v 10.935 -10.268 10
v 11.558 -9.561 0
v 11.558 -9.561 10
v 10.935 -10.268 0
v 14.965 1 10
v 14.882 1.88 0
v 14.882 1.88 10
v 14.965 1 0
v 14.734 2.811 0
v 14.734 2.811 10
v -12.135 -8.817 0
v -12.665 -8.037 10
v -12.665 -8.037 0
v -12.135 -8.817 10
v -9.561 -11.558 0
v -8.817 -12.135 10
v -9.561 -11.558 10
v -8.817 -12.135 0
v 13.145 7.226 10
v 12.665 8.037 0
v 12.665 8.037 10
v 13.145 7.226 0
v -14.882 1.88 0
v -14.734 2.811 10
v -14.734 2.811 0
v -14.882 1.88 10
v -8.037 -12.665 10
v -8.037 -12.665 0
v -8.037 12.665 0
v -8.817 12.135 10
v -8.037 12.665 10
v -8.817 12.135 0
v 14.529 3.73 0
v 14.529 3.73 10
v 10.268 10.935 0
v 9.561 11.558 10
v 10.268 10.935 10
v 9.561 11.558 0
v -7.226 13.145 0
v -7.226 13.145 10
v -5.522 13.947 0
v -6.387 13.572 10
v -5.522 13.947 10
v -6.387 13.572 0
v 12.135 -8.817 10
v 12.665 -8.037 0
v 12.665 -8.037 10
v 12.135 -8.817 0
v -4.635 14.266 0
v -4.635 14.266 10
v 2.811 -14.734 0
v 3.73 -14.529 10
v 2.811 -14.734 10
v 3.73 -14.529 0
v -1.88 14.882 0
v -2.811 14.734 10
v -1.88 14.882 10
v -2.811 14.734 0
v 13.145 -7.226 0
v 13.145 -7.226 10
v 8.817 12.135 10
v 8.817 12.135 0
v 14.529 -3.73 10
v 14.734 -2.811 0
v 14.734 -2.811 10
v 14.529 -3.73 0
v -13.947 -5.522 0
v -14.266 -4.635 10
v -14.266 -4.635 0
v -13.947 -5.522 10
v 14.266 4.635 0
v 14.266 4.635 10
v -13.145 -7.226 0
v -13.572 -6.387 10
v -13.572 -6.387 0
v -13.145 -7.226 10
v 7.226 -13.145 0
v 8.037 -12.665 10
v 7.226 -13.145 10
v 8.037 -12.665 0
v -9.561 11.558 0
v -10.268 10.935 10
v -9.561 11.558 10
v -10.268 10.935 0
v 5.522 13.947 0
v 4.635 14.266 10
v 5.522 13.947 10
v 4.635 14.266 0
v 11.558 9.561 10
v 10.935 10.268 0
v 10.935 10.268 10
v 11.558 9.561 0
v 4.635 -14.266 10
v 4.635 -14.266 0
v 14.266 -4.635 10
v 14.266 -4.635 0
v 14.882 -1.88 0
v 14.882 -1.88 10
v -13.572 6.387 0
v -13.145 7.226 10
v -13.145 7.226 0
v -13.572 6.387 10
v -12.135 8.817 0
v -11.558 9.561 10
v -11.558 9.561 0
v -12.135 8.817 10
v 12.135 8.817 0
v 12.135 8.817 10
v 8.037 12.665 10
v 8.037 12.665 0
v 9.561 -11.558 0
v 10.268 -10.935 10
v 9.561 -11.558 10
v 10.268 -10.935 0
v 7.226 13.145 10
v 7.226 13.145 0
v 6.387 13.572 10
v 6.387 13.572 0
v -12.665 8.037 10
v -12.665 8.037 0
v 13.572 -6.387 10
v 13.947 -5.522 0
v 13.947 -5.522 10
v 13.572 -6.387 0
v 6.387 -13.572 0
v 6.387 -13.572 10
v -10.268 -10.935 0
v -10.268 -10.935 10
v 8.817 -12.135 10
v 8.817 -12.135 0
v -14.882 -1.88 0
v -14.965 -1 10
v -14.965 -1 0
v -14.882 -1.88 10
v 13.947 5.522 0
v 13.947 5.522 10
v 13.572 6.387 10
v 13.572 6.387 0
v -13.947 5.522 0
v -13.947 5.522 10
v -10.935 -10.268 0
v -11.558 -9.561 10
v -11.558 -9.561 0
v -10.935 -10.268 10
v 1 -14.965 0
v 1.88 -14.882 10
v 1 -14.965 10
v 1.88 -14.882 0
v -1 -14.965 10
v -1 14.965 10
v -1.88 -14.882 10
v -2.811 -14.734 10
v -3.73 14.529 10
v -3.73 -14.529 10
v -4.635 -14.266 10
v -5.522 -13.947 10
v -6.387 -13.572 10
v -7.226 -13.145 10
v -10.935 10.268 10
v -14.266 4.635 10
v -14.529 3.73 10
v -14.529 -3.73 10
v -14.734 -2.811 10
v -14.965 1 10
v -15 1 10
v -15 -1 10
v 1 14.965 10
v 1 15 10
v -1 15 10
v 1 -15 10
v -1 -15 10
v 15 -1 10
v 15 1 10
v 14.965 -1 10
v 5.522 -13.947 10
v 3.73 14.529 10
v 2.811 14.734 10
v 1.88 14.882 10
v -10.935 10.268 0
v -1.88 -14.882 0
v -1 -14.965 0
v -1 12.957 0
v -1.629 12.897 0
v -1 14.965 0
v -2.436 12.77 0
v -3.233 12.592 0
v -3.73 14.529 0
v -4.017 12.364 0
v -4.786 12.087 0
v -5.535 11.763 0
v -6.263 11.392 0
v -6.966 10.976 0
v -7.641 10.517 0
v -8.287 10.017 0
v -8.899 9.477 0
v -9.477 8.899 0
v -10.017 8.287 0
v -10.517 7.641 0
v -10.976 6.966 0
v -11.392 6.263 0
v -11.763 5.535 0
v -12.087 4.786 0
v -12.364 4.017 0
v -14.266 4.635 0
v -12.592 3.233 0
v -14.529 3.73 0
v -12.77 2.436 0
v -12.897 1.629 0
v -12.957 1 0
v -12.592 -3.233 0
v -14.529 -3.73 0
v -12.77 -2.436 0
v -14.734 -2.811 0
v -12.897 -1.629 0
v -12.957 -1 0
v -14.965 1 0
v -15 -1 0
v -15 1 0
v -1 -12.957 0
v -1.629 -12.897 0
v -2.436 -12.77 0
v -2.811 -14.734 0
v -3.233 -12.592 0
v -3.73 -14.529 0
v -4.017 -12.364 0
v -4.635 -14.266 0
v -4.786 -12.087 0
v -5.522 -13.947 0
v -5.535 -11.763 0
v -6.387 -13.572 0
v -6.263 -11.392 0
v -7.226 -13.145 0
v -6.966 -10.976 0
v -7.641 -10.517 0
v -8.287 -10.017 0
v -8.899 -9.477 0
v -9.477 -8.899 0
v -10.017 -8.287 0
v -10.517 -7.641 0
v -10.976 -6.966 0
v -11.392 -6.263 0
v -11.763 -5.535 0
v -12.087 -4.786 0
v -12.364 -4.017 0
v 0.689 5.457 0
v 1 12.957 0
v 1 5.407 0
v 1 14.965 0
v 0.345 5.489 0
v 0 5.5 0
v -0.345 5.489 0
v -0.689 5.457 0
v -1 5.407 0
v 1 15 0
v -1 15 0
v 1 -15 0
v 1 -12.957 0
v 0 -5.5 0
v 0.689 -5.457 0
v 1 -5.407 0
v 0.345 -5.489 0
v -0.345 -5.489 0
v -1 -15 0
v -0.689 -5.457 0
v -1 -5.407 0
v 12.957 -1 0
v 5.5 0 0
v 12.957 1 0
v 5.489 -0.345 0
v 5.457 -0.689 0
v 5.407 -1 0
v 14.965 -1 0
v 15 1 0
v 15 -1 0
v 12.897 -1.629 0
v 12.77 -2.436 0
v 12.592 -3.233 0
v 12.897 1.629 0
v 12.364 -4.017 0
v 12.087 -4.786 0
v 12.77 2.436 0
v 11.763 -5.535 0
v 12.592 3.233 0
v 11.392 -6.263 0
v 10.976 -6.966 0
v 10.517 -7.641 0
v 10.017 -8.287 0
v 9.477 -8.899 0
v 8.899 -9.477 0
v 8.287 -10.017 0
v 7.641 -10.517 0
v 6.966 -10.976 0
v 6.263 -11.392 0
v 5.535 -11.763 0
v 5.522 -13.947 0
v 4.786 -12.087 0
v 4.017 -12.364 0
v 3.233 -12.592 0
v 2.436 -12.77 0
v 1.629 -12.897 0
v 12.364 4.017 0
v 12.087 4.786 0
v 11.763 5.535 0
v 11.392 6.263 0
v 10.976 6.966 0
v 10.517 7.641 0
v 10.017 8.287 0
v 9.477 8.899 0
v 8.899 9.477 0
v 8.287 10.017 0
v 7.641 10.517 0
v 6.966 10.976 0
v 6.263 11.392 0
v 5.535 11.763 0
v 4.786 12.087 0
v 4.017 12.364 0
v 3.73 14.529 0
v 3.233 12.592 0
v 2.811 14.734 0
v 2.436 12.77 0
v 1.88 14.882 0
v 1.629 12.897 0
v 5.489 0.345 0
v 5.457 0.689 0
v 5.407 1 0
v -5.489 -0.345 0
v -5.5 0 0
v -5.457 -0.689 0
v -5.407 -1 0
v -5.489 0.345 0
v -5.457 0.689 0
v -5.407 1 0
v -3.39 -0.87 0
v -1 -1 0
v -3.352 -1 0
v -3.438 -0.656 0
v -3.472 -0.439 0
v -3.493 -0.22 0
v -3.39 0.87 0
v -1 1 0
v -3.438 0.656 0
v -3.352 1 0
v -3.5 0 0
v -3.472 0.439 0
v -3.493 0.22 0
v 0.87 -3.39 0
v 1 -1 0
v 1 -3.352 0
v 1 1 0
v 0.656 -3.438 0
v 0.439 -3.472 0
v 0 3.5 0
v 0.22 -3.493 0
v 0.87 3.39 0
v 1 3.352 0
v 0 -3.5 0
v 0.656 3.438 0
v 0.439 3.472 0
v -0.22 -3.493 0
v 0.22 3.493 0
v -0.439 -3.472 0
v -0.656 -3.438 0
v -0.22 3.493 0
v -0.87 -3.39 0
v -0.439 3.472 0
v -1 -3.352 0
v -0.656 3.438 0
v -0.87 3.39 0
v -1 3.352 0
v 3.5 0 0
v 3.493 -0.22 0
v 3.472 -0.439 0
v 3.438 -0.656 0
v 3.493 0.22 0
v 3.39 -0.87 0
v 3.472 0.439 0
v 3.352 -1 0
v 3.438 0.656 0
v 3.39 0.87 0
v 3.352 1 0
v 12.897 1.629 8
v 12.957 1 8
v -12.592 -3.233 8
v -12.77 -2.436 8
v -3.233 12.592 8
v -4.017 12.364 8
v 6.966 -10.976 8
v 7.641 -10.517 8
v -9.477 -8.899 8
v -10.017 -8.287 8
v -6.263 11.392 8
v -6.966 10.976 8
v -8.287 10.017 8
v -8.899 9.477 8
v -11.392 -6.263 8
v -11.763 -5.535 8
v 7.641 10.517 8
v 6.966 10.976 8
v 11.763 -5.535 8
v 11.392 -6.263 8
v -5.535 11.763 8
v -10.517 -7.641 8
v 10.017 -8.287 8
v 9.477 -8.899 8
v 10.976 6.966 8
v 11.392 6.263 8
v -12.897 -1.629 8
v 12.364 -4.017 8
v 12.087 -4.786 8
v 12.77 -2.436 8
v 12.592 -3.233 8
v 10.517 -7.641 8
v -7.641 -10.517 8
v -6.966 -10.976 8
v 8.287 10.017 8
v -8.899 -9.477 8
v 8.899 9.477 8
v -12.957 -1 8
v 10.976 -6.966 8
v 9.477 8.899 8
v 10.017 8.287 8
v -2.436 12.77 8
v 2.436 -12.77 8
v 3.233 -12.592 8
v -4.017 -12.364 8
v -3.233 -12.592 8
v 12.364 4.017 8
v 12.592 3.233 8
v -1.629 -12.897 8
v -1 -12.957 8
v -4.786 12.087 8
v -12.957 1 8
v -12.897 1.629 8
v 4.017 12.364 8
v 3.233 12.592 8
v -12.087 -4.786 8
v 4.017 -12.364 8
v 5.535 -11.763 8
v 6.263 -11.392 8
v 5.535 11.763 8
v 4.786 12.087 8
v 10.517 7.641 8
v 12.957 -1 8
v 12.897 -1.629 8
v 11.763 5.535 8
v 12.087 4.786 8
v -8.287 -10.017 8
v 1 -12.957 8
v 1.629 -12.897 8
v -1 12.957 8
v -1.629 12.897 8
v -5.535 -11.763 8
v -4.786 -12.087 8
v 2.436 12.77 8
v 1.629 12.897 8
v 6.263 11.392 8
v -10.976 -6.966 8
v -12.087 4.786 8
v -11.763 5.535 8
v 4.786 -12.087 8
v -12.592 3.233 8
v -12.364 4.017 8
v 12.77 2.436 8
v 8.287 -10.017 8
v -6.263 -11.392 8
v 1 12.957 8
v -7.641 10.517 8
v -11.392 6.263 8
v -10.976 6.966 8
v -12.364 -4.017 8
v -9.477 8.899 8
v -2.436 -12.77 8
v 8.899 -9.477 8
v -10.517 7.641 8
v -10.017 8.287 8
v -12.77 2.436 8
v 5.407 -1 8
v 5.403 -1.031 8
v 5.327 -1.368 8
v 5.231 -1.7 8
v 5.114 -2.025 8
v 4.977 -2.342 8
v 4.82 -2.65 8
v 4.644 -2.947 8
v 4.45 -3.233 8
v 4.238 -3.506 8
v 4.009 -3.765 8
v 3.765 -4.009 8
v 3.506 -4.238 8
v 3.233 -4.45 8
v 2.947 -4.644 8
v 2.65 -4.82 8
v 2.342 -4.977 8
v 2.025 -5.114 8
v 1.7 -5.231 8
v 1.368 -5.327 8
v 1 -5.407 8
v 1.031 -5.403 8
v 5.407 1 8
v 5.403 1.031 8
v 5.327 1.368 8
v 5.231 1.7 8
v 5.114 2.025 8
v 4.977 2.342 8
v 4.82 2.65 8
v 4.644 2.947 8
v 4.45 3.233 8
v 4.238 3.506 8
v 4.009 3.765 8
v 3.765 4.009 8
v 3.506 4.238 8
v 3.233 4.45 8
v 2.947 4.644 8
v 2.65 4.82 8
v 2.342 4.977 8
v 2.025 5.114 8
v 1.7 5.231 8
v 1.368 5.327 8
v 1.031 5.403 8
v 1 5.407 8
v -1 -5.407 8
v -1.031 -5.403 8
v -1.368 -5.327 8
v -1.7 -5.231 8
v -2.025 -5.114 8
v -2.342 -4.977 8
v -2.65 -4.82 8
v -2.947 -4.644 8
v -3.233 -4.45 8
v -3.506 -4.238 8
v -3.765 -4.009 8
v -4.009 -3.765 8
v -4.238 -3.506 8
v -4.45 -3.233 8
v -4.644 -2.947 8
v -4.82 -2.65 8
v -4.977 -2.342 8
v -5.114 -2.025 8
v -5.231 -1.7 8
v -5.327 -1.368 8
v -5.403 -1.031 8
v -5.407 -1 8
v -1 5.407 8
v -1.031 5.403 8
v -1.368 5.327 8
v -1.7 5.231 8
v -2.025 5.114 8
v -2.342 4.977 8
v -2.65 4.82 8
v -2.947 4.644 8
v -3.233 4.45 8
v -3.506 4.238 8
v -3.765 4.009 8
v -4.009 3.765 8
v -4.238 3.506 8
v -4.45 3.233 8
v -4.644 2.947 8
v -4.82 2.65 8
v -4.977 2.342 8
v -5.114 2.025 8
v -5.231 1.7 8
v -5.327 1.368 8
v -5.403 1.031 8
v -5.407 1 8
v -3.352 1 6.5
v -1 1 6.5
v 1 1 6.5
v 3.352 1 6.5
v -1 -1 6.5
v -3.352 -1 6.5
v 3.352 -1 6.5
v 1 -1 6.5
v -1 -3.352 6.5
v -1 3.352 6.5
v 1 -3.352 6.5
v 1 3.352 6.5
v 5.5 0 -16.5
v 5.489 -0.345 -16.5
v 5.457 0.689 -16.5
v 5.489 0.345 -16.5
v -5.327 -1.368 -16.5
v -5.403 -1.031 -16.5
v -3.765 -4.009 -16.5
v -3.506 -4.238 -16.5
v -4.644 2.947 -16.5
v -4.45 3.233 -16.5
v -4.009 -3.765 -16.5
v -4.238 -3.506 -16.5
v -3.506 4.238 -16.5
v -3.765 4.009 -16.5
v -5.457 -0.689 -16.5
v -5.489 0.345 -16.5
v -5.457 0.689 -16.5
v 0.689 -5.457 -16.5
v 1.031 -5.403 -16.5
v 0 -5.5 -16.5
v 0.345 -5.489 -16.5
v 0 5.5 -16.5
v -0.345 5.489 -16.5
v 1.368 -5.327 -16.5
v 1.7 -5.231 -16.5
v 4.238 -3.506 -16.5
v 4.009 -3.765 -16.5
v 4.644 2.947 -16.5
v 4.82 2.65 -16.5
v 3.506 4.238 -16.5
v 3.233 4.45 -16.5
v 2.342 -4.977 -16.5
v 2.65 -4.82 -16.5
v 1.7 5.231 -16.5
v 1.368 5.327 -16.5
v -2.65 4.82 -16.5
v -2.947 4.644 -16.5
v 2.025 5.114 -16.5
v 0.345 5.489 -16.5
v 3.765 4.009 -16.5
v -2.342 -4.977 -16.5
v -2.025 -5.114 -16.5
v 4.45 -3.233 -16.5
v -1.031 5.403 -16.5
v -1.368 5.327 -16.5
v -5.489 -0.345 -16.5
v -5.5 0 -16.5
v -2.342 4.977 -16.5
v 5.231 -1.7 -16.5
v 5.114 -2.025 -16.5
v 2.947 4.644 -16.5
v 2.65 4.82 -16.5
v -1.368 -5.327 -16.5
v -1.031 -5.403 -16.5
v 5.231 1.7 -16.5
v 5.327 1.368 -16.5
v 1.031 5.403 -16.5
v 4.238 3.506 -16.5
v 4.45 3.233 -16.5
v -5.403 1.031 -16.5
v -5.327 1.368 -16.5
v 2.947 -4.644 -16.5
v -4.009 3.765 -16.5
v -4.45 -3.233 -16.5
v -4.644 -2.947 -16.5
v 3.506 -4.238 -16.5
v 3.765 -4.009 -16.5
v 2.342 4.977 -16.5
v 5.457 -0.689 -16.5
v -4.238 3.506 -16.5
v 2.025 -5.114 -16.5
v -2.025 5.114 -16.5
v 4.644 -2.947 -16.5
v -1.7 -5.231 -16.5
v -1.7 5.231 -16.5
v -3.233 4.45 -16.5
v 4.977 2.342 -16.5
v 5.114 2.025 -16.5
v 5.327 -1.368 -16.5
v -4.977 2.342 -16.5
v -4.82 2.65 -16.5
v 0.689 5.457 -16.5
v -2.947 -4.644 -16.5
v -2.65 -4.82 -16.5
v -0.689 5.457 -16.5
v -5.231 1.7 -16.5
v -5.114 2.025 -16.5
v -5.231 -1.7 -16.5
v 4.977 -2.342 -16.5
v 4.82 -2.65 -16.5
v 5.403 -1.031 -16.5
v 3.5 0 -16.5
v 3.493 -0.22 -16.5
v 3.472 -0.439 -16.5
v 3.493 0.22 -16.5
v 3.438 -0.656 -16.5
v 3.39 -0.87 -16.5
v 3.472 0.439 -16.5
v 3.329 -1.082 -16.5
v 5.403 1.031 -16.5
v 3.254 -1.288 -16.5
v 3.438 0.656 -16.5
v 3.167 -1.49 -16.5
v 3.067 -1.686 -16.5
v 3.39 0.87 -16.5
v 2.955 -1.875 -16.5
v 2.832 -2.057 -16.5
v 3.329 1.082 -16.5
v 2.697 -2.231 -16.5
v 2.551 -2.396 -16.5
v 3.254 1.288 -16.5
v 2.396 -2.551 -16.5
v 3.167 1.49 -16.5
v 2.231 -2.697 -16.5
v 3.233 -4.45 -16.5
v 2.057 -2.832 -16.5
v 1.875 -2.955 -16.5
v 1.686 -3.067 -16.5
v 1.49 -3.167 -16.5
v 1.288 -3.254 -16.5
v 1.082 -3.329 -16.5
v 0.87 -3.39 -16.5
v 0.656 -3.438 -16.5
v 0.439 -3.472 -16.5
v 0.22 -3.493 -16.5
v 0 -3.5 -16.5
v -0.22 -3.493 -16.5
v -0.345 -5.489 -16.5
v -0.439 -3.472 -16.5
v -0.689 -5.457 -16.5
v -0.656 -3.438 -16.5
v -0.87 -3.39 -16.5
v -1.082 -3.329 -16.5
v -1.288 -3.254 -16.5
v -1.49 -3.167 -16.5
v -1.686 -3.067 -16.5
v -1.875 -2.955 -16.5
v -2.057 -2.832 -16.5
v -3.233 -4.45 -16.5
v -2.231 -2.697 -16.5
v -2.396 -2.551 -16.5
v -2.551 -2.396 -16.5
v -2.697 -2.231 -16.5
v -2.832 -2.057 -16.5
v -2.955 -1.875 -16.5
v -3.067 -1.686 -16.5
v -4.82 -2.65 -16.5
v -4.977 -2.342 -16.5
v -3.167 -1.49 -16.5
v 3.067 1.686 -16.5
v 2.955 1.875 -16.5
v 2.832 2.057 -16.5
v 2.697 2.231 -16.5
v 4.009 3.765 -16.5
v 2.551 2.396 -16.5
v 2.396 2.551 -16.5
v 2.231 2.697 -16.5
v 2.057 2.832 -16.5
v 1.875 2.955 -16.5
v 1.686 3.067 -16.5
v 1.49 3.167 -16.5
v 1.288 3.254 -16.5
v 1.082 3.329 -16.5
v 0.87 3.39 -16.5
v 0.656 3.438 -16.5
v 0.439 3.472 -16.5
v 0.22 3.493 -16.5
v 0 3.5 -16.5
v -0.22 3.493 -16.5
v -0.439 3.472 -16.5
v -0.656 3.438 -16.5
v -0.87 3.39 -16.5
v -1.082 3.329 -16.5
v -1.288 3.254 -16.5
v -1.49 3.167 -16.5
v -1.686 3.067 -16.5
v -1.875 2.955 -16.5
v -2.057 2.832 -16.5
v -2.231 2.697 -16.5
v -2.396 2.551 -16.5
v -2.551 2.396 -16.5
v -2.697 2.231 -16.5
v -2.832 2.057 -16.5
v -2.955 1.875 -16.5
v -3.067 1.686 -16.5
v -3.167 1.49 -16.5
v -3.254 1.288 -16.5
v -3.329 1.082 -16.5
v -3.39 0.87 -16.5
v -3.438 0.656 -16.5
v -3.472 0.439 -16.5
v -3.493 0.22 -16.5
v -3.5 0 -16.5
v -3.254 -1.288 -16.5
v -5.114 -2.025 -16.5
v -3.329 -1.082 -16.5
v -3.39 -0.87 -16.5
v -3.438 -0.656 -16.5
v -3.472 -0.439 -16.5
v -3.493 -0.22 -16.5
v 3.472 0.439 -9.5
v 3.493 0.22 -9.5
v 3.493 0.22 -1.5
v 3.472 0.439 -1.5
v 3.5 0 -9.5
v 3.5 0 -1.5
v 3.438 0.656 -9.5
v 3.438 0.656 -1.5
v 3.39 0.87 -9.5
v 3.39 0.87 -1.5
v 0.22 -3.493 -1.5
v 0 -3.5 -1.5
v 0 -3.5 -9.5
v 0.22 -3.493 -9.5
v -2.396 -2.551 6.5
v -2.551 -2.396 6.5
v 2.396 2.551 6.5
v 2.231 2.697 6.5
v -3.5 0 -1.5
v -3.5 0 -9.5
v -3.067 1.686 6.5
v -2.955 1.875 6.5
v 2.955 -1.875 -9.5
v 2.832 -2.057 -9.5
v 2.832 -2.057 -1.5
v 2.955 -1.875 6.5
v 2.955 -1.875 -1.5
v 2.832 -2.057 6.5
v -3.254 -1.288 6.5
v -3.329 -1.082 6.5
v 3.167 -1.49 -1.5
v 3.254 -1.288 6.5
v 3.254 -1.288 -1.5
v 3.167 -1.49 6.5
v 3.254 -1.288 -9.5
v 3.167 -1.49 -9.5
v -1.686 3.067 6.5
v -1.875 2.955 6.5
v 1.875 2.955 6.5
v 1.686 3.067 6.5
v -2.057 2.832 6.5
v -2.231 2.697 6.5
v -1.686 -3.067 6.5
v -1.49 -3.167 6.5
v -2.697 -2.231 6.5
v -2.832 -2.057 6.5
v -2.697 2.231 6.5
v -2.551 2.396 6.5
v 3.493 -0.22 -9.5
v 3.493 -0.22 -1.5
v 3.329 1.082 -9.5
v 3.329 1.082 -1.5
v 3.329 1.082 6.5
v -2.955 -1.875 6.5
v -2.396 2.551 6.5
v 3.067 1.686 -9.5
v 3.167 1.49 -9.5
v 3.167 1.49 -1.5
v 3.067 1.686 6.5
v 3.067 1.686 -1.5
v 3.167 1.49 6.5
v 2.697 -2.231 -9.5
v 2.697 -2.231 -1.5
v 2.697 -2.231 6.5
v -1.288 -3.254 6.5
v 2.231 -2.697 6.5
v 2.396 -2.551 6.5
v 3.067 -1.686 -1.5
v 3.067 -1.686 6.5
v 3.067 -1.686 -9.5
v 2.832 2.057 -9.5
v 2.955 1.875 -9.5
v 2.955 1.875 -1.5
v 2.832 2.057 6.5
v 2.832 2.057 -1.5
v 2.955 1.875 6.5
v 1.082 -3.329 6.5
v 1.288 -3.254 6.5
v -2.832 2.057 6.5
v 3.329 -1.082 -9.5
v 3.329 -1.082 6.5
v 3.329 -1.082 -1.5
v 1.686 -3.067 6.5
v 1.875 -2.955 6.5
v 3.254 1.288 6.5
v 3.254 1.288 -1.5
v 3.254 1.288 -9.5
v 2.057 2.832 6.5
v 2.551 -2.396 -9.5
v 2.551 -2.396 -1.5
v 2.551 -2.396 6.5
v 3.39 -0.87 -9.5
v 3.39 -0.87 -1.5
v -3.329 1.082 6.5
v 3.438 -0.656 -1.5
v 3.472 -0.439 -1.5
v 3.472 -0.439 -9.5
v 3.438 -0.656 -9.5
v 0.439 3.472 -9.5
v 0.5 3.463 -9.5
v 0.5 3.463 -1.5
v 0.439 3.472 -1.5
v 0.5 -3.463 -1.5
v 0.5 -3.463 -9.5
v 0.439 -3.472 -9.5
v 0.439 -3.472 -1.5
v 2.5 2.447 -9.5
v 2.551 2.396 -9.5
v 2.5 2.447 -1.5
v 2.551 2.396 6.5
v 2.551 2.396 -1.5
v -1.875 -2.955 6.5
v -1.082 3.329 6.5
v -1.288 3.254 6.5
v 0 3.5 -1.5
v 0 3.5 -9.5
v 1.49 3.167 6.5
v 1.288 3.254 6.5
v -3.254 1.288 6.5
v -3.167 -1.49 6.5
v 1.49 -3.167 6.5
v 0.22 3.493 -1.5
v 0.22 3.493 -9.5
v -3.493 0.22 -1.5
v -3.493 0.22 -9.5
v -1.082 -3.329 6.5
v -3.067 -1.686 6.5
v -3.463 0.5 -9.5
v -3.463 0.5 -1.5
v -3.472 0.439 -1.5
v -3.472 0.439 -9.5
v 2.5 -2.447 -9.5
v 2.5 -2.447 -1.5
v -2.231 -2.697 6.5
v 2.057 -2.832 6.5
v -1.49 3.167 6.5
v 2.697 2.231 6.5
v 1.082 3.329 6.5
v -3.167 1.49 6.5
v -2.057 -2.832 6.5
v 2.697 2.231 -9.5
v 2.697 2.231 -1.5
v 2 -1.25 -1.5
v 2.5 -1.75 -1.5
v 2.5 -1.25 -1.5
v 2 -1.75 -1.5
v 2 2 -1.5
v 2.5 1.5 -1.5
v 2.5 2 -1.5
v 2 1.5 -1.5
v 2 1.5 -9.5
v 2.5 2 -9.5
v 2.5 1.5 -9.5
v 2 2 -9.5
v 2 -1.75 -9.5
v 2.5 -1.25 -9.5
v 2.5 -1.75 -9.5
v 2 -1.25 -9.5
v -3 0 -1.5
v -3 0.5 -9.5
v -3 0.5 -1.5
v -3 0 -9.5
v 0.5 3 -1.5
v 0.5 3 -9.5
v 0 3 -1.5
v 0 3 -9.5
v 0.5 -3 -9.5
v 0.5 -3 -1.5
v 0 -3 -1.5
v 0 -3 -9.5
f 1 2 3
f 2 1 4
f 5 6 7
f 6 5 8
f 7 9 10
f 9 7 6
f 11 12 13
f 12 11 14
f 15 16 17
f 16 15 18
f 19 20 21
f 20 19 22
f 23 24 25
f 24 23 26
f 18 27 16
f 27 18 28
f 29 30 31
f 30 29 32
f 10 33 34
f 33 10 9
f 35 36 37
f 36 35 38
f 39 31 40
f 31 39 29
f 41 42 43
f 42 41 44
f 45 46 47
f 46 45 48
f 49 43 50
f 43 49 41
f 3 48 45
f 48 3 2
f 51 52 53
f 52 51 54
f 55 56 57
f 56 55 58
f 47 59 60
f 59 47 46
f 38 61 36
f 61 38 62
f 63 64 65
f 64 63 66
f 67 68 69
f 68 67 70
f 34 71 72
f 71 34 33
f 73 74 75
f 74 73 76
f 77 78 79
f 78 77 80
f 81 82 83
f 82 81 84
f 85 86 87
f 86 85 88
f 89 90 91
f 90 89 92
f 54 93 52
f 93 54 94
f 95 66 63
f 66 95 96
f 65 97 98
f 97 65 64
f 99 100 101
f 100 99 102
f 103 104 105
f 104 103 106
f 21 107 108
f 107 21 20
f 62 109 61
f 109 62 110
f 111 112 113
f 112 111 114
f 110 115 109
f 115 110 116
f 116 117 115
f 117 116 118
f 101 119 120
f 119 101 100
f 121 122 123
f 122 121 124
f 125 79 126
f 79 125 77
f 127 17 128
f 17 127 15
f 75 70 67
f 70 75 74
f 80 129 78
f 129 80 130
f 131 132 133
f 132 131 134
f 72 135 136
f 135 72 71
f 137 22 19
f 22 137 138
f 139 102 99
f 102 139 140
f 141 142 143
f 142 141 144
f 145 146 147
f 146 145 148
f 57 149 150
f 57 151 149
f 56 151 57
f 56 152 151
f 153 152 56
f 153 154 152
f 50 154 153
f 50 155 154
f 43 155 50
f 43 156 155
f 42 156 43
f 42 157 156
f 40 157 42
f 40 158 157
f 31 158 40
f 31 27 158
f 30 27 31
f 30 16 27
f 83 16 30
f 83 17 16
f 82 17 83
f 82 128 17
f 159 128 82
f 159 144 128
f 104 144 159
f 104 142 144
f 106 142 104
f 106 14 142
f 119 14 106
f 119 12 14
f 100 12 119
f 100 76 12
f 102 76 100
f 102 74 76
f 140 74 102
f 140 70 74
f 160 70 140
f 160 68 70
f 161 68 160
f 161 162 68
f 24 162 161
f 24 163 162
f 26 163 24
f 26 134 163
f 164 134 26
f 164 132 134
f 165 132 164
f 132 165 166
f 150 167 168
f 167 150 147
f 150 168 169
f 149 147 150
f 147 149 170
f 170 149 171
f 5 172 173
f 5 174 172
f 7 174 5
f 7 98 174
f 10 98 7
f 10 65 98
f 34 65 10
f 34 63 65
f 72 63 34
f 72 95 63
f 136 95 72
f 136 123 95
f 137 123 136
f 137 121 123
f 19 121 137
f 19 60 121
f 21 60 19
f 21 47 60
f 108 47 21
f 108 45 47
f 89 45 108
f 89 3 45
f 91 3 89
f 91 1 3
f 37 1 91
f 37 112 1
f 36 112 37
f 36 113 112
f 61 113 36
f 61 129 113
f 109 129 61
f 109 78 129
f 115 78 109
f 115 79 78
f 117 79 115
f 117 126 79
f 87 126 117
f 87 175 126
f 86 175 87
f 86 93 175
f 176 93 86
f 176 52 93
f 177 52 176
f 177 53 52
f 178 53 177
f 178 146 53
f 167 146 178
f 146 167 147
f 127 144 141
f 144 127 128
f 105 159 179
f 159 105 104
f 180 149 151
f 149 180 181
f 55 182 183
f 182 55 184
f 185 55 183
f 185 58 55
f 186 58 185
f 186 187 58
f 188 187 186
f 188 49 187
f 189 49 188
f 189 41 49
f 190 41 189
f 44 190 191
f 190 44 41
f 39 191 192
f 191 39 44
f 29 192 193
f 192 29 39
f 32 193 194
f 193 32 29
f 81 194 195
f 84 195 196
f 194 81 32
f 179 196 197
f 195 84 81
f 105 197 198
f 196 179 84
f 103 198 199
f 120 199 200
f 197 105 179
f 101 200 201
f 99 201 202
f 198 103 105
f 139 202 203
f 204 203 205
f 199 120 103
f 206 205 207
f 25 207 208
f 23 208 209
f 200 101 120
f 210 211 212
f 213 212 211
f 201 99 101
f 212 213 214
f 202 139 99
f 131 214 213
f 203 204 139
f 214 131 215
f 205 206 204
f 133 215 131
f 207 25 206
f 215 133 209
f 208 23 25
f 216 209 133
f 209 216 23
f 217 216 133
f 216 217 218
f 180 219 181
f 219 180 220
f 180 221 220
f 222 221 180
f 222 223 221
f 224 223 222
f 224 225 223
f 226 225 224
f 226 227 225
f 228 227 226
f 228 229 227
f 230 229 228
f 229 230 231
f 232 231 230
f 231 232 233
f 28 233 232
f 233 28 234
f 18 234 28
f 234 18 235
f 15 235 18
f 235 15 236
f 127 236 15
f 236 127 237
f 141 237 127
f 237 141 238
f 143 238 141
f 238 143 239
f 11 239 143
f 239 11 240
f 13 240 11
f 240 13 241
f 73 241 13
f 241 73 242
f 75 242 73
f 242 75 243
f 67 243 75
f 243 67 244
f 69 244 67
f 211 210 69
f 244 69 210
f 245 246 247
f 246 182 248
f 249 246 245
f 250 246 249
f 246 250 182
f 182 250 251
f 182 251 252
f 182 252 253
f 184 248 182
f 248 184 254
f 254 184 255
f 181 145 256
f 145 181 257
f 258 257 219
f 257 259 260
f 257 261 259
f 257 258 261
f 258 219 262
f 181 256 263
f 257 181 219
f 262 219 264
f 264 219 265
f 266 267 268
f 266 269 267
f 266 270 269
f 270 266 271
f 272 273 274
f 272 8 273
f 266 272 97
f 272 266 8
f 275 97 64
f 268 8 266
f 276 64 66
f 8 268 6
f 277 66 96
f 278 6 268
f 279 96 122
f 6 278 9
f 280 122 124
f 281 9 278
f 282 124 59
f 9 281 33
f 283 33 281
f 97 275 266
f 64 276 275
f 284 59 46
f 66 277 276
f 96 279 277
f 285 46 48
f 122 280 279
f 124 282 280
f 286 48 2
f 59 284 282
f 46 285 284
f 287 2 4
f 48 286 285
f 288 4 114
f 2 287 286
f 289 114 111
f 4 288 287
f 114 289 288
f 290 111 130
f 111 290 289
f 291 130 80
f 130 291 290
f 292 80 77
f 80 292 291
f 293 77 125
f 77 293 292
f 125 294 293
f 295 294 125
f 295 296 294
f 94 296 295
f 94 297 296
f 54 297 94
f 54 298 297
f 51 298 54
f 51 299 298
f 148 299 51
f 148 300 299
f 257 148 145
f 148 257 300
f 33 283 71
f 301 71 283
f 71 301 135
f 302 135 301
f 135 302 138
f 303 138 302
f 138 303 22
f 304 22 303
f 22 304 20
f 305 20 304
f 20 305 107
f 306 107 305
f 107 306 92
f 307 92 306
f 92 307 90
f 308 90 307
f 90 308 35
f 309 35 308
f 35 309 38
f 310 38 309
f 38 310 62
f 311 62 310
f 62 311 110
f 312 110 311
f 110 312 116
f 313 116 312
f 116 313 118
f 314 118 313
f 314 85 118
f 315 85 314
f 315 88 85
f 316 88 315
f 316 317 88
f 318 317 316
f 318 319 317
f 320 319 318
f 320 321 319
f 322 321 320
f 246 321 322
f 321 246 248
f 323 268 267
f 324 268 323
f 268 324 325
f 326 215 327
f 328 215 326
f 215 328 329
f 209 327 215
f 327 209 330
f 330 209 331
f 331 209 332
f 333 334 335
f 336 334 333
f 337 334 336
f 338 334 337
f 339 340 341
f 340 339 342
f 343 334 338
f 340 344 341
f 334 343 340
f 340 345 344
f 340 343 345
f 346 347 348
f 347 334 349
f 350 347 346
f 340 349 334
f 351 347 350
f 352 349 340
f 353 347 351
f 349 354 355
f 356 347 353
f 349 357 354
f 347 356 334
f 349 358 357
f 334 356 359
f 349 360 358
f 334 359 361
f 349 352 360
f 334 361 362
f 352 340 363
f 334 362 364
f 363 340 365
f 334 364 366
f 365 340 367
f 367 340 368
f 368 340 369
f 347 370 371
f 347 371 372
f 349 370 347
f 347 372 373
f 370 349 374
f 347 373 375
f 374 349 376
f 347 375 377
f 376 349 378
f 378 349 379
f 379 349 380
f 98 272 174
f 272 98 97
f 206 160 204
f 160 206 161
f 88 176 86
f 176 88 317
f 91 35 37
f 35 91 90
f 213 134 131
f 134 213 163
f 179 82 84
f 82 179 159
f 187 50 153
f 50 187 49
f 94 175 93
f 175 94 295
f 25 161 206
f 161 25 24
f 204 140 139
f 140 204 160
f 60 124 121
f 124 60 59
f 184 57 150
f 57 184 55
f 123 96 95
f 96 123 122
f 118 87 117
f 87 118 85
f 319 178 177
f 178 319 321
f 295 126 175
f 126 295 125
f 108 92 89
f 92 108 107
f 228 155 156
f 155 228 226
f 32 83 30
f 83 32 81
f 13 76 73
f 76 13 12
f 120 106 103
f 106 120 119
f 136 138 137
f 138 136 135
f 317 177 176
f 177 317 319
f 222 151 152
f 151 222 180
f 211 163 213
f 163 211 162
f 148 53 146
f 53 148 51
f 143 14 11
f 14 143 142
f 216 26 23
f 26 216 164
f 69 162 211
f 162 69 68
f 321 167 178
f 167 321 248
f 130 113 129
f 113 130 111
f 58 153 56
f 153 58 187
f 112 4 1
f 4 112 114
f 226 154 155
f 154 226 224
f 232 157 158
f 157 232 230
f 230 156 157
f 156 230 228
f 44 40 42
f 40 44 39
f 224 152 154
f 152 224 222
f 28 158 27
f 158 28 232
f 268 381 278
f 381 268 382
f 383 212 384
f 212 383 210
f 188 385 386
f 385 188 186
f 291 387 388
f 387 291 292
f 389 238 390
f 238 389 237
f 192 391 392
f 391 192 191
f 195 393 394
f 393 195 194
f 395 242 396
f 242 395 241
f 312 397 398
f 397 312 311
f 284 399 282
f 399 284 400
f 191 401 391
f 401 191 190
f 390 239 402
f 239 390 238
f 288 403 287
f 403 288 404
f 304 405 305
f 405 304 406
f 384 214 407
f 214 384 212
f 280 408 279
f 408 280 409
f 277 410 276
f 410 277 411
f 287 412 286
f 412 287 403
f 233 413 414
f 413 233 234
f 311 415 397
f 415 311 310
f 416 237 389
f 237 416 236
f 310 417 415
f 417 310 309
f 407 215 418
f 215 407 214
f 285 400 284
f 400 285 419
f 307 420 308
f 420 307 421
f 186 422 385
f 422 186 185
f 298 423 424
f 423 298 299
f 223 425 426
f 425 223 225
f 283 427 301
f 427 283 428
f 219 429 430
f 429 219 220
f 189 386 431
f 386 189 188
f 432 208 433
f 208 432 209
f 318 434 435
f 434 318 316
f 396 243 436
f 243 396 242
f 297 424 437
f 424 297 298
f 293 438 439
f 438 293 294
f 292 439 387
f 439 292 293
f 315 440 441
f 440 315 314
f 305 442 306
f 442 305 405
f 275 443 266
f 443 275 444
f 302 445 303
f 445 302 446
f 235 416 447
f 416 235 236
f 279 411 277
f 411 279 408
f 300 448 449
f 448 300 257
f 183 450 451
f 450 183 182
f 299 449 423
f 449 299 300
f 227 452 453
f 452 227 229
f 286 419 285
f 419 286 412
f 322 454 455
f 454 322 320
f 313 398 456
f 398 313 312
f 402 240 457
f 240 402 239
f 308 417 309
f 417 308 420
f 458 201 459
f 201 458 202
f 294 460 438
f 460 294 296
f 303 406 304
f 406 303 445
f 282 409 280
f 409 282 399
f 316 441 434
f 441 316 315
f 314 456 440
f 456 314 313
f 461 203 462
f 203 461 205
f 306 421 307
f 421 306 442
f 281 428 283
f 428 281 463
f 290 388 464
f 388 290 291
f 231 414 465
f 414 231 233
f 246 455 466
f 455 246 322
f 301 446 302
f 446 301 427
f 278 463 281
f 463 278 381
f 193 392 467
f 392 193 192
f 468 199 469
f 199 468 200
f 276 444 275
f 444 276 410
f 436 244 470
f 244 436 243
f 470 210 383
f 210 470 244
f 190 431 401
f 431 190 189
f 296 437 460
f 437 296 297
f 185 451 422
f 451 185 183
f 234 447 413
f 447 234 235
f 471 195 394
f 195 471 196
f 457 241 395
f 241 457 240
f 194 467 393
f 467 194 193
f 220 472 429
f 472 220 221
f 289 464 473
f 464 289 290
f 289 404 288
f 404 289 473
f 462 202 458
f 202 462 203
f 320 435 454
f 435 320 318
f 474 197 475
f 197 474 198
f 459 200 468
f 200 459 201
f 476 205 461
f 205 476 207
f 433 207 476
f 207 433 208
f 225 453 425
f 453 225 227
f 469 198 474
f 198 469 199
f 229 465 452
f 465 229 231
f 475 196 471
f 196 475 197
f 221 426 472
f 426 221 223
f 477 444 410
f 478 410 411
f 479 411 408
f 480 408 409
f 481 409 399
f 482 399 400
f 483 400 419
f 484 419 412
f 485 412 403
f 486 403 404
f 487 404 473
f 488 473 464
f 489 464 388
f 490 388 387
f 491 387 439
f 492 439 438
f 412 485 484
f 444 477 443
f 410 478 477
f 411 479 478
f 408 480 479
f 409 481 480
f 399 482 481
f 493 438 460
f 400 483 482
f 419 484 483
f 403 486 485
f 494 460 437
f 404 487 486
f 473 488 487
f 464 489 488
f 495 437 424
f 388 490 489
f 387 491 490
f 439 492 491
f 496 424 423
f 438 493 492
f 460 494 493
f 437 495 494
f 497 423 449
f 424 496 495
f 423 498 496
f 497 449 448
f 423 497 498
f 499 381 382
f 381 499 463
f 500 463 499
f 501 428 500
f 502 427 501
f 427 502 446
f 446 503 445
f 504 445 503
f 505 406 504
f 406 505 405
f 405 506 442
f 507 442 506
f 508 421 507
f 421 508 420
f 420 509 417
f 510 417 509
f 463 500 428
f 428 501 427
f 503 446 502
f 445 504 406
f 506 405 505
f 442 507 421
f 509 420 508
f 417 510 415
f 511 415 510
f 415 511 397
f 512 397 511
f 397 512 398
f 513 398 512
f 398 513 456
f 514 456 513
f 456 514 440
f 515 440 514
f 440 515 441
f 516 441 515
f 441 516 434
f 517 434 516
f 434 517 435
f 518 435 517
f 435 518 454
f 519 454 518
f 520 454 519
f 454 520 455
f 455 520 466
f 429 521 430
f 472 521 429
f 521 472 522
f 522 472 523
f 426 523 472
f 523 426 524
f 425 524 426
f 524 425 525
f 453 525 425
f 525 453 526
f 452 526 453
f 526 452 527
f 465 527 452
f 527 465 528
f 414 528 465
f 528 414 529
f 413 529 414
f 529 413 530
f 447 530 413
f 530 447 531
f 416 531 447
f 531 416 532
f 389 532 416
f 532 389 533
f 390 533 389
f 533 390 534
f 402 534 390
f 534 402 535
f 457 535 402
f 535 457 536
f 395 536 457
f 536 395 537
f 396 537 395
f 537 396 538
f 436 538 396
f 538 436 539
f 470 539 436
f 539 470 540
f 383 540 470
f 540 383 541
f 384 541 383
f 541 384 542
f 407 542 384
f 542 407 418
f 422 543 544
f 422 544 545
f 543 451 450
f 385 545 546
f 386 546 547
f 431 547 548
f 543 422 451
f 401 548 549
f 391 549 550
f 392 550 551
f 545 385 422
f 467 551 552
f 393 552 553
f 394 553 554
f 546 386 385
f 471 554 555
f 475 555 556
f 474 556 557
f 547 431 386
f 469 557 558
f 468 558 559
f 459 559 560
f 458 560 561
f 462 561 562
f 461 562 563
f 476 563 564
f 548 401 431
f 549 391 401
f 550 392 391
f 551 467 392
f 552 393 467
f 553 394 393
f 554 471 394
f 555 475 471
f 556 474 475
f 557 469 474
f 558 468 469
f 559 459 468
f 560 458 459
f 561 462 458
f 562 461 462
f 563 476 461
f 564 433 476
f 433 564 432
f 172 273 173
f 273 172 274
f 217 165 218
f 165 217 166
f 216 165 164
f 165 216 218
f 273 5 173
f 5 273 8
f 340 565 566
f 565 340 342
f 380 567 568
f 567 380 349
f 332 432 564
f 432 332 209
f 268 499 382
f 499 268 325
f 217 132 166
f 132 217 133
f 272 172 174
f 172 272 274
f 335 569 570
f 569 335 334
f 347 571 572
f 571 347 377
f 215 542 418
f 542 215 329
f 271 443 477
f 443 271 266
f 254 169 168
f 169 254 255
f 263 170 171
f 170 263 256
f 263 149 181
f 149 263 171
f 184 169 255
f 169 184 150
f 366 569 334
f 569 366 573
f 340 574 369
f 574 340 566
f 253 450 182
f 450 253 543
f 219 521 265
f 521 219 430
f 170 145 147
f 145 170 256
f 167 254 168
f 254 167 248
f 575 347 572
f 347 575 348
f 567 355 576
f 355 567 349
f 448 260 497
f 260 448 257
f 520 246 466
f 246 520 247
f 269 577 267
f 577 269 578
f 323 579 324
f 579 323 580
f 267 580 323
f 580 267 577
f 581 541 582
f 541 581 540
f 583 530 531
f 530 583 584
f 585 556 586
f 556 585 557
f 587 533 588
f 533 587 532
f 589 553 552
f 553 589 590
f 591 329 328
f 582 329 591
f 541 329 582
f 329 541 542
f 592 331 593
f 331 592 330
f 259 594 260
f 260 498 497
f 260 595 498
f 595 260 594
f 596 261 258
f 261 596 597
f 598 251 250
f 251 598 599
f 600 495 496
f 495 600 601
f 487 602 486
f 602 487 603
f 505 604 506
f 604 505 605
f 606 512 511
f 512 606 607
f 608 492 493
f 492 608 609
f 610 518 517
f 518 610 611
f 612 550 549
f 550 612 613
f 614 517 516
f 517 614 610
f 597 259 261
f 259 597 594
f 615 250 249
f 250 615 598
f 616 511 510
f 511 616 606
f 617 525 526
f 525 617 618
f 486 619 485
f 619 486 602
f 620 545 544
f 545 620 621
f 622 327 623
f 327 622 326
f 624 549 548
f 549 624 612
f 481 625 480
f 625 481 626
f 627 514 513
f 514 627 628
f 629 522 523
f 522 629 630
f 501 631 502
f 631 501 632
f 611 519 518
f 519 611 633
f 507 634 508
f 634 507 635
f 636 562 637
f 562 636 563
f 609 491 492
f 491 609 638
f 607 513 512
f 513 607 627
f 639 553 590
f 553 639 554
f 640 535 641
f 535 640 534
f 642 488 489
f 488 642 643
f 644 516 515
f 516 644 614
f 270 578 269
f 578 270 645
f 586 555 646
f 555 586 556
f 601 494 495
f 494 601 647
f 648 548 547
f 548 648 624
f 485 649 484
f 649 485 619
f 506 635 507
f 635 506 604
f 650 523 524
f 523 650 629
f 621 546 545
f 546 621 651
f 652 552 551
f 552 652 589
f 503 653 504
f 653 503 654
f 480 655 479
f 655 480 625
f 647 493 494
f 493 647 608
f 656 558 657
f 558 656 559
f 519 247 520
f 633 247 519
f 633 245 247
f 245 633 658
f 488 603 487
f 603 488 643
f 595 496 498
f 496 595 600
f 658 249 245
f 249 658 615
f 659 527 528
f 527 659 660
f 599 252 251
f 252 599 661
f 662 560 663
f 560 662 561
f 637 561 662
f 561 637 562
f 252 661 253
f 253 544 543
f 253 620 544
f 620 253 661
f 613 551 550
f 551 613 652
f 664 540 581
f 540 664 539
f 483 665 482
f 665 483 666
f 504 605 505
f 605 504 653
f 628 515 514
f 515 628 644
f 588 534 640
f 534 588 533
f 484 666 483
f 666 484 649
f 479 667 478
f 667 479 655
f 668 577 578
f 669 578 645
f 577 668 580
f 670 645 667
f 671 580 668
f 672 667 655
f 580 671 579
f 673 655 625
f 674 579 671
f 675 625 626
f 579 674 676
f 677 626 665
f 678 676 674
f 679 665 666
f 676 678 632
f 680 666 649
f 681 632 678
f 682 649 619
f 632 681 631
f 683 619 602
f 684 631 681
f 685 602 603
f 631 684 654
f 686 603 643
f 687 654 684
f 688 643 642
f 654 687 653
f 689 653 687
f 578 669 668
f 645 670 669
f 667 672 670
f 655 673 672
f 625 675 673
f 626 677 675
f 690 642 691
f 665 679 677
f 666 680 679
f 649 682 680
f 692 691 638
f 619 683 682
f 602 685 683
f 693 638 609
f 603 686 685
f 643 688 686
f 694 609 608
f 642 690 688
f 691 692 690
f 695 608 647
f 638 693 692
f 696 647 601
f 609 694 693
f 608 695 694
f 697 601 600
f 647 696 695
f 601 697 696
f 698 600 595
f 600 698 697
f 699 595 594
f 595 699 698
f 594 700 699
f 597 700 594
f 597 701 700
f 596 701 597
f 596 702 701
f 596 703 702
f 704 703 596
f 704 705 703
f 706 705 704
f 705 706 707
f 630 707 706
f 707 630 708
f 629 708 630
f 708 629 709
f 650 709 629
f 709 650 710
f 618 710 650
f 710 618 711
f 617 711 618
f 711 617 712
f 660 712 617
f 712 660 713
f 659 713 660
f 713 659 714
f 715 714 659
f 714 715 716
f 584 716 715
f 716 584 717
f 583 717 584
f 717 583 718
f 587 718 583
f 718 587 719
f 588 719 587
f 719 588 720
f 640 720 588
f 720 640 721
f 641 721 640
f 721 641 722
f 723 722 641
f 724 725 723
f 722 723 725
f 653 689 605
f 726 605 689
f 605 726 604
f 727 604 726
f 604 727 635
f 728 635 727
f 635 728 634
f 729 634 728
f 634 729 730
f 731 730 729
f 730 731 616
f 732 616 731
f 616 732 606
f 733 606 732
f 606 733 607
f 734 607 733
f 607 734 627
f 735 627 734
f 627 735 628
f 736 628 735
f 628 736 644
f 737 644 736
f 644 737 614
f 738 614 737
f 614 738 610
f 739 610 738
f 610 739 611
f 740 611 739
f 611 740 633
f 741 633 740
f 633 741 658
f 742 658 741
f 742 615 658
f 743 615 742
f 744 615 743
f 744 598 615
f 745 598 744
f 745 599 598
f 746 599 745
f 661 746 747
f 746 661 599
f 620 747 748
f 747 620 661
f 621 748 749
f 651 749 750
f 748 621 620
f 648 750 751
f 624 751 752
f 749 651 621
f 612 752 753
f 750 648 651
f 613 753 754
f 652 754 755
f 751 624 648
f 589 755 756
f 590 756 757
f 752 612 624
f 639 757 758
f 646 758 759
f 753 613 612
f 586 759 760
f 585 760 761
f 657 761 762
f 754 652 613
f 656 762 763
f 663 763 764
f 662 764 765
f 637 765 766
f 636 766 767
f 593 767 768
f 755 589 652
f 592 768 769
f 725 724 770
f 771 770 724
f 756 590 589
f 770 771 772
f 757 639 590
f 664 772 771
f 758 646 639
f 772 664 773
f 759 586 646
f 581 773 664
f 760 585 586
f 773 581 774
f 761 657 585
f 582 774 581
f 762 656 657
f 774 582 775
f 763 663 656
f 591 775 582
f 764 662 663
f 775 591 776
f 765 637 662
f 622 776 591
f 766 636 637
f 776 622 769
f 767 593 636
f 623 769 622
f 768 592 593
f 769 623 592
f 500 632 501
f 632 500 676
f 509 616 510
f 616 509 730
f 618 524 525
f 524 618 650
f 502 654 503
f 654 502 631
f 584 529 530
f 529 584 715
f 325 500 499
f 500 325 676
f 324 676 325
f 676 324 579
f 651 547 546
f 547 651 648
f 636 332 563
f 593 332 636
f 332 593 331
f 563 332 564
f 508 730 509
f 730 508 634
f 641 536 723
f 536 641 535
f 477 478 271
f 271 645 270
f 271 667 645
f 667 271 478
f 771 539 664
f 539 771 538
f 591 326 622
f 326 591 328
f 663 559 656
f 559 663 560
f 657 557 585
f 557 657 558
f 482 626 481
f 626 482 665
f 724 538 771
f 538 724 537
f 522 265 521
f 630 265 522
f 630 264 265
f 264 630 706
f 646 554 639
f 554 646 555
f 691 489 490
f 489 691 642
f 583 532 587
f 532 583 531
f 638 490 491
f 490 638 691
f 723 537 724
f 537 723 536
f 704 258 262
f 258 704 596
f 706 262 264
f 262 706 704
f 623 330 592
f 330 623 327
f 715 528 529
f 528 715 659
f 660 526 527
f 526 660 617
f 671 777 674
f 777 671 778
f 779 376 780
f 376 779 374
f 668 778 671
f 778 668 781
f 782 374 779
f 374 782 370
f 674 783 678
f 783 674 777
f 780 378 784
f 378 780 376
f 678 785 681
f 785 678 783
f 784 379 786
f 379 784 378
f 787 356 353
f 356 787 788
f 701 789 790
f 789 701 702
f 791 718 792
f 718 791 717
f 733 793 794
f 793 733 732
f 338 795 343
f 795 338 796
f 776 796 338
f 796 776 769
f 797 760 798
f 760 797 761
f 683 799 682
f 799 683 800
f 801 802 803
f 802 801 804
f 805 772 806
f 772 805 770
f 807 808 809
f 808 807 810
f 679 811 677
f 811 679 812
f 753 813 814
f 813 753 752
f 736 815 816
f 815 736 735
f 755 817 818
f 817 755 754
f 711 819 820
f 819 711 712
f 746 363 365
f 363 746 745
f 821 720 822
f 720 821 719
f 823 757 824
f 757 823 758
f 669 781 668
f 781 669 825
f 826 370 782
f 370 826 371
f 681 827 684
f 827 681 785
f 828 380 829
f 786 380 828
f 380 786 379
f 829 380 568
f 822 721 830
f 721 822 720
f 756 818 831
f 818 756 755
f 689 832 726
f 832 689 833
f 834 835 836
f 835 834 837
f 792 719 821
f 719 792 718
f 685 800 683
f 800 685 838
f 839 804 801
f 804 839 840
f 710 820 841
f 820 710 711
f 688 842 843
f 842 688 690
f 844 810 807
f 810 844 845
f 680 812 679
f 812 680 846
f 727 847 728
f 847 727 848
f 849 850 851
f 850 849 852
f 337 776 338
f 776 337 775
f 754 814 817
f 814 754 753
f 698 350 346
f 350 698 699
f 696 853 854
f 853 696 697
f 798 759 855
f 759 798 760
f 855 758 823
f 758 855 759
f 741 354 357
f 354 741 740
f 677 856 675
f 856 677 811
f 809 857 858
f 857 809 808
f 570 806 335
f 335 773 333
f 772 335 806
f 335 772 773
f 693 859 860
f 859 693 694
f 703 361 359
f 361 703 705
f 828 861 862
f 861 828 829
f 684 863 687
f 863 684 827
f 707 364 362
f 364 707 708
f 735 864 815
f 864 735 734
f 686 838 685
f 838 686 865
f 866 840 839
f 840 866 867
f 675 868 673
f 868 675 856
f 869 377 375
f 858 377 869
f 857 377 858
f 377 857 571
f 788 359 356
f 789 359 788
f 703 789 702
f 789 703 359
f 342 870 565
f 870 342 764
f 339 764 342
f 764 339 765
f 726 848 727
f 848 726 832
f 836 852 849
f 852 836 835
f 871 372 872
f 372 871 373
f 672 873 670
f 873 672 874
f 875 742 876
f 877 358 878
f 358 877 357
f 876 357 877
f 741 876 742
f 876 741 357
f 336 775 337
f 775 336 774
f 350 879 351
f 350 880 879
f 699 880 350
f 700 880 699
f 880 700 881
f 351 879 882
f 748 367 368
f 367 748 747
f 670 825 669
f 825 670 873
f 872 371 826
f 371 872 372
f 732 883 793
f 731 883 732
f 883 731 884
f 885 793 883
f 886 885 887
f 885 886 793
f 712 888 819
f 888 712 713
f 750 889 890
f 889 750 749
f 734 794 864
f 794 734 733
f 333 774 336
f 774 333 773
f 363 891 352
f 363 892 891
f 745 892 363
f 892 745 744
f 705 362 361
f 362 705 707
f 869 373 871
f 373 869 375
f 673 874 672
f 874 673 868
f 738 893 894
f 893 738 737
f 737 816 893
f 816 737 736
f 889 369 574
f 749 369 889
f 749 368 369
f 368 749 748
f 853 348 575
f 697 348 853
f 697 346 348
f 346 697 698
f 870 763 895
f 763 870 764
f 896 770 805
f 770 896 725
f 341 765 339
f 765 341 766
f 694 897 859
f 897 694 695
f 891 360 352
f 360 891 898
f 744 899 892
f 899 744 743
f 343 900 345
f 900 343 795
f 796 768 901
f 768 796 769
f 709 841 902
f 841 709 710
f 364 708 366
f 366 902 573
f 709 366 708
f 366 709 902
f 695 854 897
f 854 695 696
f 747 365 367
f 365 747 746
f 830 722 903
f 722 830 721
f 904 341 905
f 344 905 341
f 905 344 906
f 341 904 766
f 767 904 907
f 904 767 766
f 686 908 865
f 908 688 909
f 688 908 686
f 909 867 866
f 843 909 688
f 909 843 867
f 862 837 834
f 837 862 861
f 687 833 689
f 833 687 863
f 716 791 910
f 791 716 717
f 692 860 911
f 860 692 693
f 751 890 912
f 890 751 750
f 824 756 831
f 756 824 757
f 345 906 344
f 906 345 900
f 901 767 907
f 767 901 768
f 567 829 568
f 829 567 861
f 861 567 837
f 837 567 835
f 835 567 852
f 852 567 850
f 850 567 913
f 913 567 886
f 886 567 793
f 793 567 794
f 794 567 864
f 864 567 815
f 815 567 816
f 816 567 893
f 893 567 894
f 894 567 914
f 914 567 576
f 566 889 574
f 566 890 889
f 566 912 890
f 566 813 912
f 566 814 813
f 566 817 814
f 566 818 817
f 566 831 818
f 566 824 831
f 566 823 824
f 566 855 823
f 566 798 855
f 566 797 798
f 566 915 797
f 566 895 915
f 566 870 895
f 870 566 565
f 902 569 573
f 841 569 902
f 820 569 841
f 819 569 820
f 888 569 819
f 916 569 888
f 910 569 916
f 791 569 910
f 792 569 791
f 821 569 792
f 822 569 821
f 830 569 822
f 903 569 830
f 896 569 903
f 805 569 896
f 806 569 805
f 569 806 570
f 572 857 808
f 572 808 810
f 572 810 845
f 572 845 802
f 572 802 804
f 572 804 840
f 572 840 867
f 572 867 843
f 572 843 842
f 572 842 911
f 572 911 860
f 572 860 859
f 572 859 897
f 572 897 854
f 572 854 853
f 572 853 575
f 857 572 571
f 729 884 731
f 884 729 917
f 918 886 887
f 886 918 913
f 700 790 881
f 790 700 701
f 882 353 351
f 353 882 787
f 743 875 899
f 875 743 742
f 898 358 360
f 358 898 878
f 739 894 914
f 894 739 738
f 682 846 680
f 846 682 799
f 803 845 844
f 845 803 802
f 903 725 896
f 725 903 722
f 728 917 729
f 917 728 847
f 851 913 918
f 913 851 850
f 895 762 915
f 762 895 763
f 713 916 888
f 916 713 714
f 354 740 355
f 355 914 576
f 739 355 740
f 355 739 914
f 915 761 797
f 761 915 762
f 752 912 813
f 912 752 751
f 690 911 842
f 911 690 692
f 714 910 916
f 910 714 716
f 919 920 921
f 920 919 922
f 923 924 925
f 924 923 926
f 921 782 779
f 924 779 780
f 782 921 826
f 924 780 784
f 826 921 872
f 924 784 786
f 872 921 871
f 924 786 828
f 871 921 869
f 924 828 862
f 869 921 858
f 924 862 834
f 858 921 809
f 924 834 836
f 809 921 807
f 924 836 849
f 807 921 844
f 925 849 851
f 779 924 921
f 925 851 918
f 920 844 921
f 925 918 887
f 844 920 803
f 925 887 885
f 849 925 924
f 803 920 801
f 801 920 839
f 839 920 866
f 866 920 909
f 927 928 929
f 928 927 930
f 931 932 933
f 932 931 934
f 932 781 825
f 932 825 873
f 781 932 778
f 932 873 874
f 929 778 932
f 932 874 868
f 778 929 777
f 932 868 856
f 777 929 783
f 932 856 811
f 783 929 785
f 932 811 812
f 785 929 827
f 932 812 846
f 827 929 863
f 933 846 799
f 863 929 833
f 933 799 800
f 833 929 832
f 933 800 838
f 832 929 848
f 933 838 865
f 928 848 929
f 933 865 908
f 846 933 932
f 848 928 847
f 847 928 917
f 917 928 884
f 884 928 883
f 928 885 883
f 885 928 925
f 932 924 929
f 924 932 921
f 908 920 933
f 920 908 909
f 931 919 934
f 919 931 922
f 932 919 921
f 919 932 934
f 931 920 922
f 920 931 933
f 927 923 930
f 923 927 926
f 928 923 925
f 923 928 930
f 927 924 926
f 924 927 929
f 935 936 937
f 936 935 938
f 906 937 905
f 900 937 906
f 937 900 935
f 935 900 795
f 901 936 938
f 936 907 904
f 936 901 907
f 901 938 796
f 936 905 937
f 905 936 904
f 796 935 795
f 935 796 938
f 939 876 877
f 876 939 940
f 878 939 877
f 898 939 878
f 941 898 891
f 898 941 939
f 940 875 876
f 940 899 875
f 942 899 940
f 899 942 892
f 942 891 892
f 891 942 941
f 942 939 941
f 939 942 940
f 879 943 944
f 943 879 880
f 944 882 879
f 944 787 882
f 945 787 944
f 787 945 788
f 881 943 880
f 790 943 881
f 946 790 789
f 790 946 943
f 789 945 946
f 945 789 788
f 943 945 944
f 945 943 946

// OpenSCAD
// fan speed knob
$fn = 100;
knob_radius = 15;
knob_width = 10;
wt = 2;

neck_length = 25;
neck_outer_radius = 5.5;
neck_inner_radius = 5.5-wt;


module knob() {
   difference() {
     cylinder(r=knob_radius, h=knob_width); 
     cylinder(r=knob_radius-wt, h=knob_width-wt);
   }
   translate([-knob_radius,-wt/2,0])
   cube([knob_radius*2,wt, knob_width]);
   rotate([0,0,90]) 
   translate([-knob_radius,-wt/2,0])
   cube([knob_radius*2,wt, knob_width]);
}

module neck() {
   difference() {
     cylinder(r=neck_outer_radius, h=neck_length); 
     cylinder(r=neck_inner_radius, h=neck_length-wt);
   }
   shaft_len1 = 8;
   shaft_start = 7;
   translate([neck_inner_radius-1,-neck_inner_radius,shaft_start])
   cube([1.5,neck_inner_radius*2,shaft_len1]);
   translate([neck_inner_radius-1.5,-neck_inner_radius/2,shaft_start])
   cube([0.5,0.5,shaft_len1]);
    translate([neck_inner_radius-1.5,(neck_inner_radius-wt),shaft_start])
   cube([0.5,0.5,shaft_len1]);
   translate([-neck_inner_radius,0,shaft_start])
   cube([0.5,0.5,shaft_len1]);
   translate([0,neck_inner_radius-0.5,shaft_start])
   cube([0.5,0.5,shaft_len1]);
   translate([0,-neck_inner_radius,shaft_start])
   cube([0.5,0.5,shaft_len1]);
}

knob();
translate([0,0,-neck_length/2-2*wt])
neck();
